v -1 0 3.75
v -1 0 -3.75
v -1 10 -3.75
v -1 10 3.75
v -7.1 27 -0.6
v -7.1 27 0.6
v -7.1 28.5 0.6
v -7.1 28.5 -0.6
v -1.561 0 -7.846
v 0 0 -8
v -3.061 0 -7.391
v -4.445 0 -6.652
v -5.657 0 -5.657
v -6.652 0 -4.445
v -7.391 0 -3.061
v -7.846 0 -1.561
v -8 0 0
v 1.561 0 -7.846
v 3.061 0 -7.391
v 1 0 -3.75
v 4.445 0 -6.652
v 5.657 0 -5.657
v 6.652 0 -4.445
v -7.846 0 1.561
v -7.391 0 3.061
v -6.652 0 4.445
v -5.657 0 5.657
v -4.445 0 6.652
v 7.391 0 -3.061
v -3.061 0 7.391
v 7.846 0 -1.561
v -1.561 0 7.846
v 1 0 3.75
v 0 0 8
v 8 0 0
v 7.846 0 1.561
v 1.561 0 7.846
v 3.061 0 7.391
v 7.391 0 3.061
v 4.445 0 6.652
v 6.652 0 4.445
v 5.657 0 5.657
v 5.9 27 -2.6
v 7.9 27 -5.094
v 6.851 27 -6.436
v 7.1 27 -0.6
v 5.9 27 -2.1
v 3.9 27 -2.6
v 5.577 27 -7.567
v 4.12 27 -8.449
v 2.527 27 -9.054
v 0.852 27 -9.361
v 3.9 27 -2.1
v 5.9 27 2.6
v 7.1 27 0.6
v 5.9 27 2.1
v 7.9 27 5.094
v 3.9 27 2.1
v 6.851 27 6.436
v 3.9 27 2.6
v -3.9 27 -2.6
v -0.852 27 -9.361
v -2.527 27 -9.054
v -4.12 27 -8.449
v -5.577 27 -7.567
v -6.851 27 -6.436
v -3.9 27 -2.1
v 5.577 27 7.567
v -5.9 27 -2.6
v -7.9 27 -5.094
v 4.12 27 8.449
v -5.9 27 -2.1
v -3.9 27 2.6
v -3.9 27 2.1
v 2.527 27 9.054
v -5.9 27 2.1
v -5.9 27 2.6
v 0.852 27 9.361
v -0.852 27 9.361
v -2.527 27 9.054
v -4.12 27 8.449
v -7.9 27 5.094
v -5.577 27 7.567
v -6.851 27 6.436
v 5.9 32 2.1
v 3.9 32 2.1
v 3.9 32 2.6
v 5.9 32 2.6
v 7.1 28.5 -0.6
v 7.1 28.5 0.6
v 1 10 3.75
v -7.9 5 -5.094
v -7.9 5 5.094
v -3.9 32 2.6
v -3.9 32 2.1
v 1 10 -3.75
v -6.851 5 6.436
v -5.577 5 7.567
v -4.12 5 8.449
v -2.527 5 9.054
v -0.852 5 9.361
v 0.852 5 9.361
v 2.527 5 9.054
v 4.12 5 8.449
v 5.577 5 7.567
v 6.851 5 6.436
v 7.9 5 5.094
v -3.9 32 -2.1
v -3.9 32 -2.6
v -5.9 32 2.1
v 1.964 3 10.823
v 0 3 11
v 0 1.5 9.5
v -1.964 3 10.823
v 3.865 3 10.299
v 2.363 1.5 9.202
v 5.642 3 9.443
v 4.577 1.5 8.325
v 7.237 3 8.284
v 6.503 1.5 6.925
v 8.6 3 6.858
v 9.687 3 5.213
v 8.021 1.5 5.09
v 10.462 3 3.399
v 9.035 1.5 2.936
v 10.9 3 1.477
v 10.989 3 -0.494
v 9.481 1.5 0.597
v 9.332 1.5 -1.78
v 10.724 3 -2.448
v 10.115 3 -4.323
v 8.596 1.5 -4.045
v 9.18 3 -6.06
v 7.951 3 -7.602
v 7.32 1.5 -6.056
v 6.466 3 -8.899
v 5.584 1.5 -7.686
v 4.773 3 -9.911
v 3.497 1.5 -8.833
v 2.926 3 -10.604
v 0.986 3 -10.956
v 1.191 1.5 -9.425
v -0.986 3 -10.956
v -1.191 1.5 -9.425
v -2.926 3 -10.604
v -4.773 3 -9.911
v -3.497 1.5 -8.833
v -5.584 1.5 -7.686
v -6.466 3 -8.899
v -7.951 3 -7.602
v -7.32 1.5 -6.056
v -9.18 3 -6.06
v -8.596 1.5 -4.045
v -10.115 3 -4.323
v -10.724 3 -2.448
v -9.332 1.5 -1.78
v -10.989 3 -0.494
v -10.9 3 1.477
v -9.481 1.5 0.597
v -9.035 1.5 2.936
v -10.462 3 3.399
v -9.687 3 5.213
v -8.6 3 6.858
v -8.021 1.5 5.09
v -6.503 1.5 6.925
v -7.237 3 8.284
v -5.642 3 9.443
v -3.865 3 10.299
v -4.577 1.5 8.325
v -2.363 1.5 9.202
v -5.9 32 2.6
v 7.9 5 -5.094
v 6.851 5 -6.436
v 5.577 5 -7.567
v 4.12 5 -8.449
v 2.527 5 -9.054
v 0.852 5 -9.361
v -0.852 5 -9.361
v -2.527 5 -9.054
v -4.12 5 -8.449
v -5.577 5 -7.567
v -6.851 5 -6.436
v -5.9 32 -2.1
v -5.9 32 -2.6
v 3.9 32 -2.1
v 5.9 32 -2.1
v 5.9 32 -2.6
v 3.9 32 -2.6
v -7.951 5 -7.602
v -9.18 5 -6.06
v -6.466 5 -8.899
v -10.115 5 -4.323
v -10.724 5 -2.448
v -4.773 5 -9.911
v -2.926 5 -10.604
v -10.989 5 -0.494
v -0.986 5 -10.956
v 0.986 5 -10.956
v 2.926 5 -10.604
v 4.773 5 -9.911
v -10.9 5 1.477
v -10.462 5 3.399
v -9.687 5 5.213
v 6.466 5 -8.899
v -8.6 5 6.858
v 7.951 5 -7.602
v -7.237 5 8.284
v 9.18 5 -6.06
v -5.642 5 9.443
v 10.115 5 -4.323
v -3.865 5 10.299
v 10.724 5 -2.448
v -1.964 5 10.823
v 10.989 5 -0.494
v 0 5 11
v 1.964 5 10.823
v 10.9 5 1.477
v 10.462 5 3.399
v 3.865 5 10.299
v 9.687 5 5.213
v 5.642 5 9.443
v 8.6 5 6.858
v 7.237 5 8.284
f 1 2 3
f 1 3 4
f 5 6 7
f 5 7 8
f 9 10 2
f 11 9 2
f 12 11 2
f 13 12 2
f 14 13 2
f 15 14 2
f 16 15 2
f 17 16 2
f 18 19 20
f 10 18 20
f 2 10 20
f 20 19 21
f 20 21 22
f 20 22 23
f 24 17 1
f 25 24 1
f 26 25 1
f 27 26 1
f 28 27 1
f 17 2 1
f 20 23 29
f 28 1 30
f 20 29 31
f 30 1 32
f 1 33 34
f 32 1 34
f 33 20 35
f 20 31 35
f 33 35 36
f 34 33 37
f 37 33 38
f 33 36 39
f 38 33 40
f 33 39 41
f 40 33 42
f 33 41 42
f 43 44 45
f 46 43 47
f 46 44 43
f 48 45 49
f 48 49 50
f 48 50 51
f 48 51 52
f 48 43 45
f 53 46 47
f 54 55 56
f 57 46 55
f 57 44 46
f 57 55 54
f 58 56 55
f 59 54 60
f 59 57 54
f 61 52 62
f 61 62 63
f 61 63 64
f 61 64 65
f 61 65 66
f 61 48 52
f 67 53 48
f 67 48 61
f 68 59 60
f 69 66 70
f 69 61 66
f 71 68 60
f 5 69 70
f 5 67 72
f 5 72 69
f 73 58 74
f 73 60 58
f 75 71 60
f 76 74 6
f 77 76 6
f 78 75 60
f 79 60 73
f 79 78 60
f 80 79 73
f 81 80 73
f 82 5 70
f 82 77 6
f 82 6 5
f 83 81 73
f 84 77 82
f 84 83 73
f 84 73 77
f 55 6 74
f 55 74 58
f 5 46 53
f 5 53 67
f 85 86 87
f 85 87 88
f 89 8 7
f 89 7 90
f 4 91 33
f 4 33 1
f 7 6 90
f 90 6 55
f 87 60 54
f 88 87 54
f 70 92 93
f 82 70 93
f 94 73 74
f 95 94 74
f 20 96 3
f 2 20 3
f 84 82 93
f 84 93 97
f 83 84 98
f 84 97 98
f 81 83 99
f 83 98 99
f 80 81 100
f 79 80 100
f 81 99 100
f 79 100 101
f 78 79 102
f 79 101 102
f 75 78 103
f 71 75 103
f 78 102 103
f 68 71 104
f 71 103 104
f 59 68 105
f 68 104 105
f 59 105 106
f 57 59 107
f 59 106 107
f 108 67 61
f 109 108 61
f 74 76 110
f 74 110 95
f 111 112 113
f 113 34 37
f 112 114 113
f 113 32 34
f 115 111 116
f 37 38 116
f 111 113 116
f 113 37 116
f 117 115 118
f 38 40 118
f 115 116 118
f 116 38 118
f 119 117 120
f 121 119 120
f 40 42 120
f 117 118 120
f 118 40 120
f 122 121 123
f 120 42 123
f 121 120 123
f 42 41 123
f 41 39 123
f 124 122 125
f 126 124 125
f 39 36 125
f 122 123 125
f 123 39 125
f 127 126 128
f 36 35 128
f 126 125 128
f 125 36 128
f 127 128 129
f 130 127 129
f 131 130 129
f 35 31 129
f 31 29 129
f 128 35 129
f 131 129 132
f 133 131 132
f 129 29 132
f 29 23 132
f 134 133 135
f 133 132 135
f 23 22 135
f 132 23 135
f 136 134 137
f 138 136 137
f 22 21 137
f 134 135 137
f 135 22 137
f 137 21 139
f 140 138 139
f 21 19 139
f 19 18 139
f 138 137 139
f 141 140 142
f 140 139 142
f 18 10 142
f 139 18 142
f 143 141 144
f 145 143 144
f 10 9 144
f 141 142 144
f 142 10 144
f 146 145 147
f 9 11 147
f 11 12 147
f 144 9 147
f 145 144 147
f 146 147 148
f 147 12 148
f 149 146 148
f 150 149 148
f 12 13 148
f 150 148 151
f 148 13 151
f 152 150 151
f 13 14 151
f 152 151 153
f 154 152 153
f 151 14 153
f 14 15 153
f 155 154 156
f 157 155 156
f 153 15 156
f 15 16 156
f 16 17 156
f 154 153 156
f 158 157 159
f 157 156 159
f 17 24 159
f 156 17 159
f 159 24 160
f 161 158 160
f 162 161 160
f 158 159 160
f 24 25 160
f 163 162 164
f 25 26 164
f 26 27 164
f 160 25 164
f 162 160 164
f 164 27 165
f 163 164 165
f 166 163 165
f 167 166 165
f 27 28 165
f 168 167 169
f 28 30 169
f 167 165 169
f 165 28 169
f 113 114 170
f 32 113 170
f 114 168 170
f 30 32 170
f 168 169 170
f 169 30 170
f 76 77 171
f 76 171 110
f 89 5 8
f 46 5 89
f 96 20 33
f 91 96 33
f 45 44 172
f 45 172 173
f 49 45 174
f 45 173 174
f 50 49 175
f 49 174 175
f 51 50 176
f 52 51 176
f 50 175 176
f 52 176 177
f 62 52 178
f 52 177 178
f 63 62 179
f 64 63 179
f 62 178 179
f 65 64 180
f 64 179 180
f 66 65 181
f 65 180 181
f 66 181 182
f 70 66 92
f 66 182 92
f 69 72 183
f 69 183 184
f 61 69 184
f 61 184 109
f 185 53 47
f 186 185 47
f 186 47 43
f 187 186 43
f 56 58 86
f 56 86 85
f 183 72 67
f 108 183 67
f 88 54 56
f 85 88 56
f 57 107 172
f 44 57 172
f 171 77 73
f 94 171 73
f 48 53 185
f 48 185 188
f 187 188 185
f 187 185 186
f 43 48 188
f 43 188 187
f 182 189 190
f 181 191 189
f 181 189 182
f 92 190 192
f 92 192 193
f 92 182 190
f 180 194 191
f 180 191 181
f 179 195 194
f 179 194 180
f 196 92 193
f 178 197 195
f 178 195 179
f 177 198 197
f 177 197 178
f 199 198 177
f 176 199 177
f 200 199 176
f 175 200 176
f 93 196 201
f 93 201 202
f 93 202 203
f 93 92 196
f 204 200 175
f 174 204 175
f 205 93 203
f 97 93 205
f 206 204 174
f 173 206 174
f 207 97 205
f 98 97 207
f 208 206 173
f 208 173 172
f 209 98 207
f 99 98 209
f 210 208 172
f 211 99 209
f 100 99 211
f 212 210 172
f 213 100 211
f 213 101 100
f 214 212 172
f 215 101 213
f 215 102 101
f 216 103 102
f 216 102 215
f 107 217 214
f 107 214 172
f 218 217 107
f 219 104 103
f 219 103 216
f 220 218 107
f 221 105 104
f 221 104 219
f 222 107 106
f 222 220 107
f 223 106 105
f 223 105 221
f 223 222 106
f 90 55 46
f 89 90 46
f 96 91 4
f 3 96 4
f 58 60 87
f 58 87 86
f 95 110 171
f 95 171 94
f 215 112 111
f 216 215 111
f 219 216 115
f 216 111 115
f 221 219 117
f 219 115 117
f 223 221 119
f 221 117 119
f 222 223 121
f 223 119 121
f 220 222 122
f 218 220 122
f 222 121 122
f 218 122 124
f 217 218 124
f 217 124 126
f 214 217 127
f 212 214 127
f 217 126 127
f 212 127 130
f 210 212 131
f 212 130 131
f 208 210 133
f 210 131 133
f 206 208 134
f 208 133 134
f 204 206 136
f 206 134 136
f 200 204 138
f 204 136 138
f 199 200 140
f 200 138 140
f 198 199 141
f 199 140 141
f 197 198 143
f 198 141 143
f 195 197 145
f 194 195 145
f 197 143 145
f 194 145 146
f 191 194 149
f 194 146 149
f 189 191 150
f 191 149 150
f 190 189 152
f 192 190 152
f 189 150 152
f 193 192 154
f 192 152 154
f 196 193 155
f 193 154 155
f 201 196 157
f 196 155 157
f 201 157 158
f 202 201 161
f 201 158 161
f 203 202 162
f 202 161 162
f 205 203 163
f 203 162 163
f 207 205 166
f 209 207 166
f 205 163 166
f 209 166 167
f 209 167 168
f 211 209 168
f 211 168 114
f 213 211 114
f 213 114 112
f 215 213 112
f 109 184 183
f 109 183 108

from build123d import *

# Parameters (mm, degrees)
SKETCH_1_R          = 11
EXTRUDE_1_DEPTH     = 5
CHAMFER_1_SIZE      = 3
EXTRUDE_3_DEPTH     = 22
SKETCH_4_W          = 2
SKETCH_4_H          = 7.5
CUT_EXTRUDE_1_DEPTH = 10
SKETCH_6_W          = 2
SKETCH_6_H          = 0.5
EXTRUDE_1_2_DEPTH   = 5
SKETCH_7_W          = 14.2
SKETCH_7_H          = 1.2
EXTRUDE_2_DEPTH     = 1.5


with BuildPart() as part:
    # 草图1 → Extrude 1 (new body)
    with BuildSketch(Plane(origin=(0, 0, 0), x_dir=(1, 0, 0), z_dir=(0, 1, 0))):
        with Locations(Location((0, 0, 0), (0, 0, 270))):
            Circle(SKETCH_1_R)
    extrude(amount=EXTRUDE_1_DEPTH)

    # 倒角1
    chamfer_1_edges = [part.edges().sort_by_distance(p)[0] for p in [
        (0, 0, -11),
    ]]
    chamfer(chamfer_1_edges, length=CHAMFER_1_SIZE)

    # 草图3 → 拉伸3 (add)
    with BuildSketch(Plane(origin=(0, 5, 0), x_dir=(-1, 0, 0), z_dir=(0, 1, 0))):
        with BuildLine():
            Line((-7.9, 5.094114251), (-7.9, -5.094114251))
            ThreePointArc((-7.9, -5.094114251), (0, -9.4), (7.9, -5.094114251))
            Line((7.9, -5.094114251), (7.9, 5.094114251))
            ThreePointArc((7.9, 5.094114251), (0, 9.4), (-7.9, 5.094114251))
        make_face()
    extrude(amount=EXTRUDE_3_DEPTH)

    # 草图4 → 切除-拉伸1 (cut)
    with BuildSketch(Plane(origin=(0, 0, 0), x_dir=(-1, 0, 0), z_dir=(0, 1, 0))):
        Rectangle(SKETCH_4_W, SKETCH_4_H)
    extrude(amount=CUT_EXTRUDE_1_DEPTH, mode=Mode.SUBTRACT)

    # 草图6 → Extrude 1 2 (add)
    with BuildSketch(Plane(origin=(0, 27, 0), x_dir=(1, 0, 0), z_dir=(0, 1, 0))):
        with Locations((4.9, 2.35)):
            Rectangle(SKETCH_6_W, SKETCH_6_H)
        with Locations((-4.9, 2.35)):
            Rectangle(SKETCH_6_W, SKETCH_6_H)
        with Locations((4.9, -2.35)):
            Rectangle(SKETCH_6_W, SKETCH_6_H)
        with Locations((-4.9, -2.35)):
            Rectangle(SKETCH_6_W, SKETCH_6_H)
    extrude(amount=EXTRUDE_1_2_DEPTH)

    # 草图7 → 凸台-拉伸2 (add)
    with BuildSketch(Plane(origin=(0, 27, 0), x_dir=(1, 0, 0), z_dir=(0, 1, 0))):
        Rectangle(SKETCH_7_W, SKETCH_7_H)
    extrude(amount=EXTRUDE_2_DEPTH)


solid = part.part
